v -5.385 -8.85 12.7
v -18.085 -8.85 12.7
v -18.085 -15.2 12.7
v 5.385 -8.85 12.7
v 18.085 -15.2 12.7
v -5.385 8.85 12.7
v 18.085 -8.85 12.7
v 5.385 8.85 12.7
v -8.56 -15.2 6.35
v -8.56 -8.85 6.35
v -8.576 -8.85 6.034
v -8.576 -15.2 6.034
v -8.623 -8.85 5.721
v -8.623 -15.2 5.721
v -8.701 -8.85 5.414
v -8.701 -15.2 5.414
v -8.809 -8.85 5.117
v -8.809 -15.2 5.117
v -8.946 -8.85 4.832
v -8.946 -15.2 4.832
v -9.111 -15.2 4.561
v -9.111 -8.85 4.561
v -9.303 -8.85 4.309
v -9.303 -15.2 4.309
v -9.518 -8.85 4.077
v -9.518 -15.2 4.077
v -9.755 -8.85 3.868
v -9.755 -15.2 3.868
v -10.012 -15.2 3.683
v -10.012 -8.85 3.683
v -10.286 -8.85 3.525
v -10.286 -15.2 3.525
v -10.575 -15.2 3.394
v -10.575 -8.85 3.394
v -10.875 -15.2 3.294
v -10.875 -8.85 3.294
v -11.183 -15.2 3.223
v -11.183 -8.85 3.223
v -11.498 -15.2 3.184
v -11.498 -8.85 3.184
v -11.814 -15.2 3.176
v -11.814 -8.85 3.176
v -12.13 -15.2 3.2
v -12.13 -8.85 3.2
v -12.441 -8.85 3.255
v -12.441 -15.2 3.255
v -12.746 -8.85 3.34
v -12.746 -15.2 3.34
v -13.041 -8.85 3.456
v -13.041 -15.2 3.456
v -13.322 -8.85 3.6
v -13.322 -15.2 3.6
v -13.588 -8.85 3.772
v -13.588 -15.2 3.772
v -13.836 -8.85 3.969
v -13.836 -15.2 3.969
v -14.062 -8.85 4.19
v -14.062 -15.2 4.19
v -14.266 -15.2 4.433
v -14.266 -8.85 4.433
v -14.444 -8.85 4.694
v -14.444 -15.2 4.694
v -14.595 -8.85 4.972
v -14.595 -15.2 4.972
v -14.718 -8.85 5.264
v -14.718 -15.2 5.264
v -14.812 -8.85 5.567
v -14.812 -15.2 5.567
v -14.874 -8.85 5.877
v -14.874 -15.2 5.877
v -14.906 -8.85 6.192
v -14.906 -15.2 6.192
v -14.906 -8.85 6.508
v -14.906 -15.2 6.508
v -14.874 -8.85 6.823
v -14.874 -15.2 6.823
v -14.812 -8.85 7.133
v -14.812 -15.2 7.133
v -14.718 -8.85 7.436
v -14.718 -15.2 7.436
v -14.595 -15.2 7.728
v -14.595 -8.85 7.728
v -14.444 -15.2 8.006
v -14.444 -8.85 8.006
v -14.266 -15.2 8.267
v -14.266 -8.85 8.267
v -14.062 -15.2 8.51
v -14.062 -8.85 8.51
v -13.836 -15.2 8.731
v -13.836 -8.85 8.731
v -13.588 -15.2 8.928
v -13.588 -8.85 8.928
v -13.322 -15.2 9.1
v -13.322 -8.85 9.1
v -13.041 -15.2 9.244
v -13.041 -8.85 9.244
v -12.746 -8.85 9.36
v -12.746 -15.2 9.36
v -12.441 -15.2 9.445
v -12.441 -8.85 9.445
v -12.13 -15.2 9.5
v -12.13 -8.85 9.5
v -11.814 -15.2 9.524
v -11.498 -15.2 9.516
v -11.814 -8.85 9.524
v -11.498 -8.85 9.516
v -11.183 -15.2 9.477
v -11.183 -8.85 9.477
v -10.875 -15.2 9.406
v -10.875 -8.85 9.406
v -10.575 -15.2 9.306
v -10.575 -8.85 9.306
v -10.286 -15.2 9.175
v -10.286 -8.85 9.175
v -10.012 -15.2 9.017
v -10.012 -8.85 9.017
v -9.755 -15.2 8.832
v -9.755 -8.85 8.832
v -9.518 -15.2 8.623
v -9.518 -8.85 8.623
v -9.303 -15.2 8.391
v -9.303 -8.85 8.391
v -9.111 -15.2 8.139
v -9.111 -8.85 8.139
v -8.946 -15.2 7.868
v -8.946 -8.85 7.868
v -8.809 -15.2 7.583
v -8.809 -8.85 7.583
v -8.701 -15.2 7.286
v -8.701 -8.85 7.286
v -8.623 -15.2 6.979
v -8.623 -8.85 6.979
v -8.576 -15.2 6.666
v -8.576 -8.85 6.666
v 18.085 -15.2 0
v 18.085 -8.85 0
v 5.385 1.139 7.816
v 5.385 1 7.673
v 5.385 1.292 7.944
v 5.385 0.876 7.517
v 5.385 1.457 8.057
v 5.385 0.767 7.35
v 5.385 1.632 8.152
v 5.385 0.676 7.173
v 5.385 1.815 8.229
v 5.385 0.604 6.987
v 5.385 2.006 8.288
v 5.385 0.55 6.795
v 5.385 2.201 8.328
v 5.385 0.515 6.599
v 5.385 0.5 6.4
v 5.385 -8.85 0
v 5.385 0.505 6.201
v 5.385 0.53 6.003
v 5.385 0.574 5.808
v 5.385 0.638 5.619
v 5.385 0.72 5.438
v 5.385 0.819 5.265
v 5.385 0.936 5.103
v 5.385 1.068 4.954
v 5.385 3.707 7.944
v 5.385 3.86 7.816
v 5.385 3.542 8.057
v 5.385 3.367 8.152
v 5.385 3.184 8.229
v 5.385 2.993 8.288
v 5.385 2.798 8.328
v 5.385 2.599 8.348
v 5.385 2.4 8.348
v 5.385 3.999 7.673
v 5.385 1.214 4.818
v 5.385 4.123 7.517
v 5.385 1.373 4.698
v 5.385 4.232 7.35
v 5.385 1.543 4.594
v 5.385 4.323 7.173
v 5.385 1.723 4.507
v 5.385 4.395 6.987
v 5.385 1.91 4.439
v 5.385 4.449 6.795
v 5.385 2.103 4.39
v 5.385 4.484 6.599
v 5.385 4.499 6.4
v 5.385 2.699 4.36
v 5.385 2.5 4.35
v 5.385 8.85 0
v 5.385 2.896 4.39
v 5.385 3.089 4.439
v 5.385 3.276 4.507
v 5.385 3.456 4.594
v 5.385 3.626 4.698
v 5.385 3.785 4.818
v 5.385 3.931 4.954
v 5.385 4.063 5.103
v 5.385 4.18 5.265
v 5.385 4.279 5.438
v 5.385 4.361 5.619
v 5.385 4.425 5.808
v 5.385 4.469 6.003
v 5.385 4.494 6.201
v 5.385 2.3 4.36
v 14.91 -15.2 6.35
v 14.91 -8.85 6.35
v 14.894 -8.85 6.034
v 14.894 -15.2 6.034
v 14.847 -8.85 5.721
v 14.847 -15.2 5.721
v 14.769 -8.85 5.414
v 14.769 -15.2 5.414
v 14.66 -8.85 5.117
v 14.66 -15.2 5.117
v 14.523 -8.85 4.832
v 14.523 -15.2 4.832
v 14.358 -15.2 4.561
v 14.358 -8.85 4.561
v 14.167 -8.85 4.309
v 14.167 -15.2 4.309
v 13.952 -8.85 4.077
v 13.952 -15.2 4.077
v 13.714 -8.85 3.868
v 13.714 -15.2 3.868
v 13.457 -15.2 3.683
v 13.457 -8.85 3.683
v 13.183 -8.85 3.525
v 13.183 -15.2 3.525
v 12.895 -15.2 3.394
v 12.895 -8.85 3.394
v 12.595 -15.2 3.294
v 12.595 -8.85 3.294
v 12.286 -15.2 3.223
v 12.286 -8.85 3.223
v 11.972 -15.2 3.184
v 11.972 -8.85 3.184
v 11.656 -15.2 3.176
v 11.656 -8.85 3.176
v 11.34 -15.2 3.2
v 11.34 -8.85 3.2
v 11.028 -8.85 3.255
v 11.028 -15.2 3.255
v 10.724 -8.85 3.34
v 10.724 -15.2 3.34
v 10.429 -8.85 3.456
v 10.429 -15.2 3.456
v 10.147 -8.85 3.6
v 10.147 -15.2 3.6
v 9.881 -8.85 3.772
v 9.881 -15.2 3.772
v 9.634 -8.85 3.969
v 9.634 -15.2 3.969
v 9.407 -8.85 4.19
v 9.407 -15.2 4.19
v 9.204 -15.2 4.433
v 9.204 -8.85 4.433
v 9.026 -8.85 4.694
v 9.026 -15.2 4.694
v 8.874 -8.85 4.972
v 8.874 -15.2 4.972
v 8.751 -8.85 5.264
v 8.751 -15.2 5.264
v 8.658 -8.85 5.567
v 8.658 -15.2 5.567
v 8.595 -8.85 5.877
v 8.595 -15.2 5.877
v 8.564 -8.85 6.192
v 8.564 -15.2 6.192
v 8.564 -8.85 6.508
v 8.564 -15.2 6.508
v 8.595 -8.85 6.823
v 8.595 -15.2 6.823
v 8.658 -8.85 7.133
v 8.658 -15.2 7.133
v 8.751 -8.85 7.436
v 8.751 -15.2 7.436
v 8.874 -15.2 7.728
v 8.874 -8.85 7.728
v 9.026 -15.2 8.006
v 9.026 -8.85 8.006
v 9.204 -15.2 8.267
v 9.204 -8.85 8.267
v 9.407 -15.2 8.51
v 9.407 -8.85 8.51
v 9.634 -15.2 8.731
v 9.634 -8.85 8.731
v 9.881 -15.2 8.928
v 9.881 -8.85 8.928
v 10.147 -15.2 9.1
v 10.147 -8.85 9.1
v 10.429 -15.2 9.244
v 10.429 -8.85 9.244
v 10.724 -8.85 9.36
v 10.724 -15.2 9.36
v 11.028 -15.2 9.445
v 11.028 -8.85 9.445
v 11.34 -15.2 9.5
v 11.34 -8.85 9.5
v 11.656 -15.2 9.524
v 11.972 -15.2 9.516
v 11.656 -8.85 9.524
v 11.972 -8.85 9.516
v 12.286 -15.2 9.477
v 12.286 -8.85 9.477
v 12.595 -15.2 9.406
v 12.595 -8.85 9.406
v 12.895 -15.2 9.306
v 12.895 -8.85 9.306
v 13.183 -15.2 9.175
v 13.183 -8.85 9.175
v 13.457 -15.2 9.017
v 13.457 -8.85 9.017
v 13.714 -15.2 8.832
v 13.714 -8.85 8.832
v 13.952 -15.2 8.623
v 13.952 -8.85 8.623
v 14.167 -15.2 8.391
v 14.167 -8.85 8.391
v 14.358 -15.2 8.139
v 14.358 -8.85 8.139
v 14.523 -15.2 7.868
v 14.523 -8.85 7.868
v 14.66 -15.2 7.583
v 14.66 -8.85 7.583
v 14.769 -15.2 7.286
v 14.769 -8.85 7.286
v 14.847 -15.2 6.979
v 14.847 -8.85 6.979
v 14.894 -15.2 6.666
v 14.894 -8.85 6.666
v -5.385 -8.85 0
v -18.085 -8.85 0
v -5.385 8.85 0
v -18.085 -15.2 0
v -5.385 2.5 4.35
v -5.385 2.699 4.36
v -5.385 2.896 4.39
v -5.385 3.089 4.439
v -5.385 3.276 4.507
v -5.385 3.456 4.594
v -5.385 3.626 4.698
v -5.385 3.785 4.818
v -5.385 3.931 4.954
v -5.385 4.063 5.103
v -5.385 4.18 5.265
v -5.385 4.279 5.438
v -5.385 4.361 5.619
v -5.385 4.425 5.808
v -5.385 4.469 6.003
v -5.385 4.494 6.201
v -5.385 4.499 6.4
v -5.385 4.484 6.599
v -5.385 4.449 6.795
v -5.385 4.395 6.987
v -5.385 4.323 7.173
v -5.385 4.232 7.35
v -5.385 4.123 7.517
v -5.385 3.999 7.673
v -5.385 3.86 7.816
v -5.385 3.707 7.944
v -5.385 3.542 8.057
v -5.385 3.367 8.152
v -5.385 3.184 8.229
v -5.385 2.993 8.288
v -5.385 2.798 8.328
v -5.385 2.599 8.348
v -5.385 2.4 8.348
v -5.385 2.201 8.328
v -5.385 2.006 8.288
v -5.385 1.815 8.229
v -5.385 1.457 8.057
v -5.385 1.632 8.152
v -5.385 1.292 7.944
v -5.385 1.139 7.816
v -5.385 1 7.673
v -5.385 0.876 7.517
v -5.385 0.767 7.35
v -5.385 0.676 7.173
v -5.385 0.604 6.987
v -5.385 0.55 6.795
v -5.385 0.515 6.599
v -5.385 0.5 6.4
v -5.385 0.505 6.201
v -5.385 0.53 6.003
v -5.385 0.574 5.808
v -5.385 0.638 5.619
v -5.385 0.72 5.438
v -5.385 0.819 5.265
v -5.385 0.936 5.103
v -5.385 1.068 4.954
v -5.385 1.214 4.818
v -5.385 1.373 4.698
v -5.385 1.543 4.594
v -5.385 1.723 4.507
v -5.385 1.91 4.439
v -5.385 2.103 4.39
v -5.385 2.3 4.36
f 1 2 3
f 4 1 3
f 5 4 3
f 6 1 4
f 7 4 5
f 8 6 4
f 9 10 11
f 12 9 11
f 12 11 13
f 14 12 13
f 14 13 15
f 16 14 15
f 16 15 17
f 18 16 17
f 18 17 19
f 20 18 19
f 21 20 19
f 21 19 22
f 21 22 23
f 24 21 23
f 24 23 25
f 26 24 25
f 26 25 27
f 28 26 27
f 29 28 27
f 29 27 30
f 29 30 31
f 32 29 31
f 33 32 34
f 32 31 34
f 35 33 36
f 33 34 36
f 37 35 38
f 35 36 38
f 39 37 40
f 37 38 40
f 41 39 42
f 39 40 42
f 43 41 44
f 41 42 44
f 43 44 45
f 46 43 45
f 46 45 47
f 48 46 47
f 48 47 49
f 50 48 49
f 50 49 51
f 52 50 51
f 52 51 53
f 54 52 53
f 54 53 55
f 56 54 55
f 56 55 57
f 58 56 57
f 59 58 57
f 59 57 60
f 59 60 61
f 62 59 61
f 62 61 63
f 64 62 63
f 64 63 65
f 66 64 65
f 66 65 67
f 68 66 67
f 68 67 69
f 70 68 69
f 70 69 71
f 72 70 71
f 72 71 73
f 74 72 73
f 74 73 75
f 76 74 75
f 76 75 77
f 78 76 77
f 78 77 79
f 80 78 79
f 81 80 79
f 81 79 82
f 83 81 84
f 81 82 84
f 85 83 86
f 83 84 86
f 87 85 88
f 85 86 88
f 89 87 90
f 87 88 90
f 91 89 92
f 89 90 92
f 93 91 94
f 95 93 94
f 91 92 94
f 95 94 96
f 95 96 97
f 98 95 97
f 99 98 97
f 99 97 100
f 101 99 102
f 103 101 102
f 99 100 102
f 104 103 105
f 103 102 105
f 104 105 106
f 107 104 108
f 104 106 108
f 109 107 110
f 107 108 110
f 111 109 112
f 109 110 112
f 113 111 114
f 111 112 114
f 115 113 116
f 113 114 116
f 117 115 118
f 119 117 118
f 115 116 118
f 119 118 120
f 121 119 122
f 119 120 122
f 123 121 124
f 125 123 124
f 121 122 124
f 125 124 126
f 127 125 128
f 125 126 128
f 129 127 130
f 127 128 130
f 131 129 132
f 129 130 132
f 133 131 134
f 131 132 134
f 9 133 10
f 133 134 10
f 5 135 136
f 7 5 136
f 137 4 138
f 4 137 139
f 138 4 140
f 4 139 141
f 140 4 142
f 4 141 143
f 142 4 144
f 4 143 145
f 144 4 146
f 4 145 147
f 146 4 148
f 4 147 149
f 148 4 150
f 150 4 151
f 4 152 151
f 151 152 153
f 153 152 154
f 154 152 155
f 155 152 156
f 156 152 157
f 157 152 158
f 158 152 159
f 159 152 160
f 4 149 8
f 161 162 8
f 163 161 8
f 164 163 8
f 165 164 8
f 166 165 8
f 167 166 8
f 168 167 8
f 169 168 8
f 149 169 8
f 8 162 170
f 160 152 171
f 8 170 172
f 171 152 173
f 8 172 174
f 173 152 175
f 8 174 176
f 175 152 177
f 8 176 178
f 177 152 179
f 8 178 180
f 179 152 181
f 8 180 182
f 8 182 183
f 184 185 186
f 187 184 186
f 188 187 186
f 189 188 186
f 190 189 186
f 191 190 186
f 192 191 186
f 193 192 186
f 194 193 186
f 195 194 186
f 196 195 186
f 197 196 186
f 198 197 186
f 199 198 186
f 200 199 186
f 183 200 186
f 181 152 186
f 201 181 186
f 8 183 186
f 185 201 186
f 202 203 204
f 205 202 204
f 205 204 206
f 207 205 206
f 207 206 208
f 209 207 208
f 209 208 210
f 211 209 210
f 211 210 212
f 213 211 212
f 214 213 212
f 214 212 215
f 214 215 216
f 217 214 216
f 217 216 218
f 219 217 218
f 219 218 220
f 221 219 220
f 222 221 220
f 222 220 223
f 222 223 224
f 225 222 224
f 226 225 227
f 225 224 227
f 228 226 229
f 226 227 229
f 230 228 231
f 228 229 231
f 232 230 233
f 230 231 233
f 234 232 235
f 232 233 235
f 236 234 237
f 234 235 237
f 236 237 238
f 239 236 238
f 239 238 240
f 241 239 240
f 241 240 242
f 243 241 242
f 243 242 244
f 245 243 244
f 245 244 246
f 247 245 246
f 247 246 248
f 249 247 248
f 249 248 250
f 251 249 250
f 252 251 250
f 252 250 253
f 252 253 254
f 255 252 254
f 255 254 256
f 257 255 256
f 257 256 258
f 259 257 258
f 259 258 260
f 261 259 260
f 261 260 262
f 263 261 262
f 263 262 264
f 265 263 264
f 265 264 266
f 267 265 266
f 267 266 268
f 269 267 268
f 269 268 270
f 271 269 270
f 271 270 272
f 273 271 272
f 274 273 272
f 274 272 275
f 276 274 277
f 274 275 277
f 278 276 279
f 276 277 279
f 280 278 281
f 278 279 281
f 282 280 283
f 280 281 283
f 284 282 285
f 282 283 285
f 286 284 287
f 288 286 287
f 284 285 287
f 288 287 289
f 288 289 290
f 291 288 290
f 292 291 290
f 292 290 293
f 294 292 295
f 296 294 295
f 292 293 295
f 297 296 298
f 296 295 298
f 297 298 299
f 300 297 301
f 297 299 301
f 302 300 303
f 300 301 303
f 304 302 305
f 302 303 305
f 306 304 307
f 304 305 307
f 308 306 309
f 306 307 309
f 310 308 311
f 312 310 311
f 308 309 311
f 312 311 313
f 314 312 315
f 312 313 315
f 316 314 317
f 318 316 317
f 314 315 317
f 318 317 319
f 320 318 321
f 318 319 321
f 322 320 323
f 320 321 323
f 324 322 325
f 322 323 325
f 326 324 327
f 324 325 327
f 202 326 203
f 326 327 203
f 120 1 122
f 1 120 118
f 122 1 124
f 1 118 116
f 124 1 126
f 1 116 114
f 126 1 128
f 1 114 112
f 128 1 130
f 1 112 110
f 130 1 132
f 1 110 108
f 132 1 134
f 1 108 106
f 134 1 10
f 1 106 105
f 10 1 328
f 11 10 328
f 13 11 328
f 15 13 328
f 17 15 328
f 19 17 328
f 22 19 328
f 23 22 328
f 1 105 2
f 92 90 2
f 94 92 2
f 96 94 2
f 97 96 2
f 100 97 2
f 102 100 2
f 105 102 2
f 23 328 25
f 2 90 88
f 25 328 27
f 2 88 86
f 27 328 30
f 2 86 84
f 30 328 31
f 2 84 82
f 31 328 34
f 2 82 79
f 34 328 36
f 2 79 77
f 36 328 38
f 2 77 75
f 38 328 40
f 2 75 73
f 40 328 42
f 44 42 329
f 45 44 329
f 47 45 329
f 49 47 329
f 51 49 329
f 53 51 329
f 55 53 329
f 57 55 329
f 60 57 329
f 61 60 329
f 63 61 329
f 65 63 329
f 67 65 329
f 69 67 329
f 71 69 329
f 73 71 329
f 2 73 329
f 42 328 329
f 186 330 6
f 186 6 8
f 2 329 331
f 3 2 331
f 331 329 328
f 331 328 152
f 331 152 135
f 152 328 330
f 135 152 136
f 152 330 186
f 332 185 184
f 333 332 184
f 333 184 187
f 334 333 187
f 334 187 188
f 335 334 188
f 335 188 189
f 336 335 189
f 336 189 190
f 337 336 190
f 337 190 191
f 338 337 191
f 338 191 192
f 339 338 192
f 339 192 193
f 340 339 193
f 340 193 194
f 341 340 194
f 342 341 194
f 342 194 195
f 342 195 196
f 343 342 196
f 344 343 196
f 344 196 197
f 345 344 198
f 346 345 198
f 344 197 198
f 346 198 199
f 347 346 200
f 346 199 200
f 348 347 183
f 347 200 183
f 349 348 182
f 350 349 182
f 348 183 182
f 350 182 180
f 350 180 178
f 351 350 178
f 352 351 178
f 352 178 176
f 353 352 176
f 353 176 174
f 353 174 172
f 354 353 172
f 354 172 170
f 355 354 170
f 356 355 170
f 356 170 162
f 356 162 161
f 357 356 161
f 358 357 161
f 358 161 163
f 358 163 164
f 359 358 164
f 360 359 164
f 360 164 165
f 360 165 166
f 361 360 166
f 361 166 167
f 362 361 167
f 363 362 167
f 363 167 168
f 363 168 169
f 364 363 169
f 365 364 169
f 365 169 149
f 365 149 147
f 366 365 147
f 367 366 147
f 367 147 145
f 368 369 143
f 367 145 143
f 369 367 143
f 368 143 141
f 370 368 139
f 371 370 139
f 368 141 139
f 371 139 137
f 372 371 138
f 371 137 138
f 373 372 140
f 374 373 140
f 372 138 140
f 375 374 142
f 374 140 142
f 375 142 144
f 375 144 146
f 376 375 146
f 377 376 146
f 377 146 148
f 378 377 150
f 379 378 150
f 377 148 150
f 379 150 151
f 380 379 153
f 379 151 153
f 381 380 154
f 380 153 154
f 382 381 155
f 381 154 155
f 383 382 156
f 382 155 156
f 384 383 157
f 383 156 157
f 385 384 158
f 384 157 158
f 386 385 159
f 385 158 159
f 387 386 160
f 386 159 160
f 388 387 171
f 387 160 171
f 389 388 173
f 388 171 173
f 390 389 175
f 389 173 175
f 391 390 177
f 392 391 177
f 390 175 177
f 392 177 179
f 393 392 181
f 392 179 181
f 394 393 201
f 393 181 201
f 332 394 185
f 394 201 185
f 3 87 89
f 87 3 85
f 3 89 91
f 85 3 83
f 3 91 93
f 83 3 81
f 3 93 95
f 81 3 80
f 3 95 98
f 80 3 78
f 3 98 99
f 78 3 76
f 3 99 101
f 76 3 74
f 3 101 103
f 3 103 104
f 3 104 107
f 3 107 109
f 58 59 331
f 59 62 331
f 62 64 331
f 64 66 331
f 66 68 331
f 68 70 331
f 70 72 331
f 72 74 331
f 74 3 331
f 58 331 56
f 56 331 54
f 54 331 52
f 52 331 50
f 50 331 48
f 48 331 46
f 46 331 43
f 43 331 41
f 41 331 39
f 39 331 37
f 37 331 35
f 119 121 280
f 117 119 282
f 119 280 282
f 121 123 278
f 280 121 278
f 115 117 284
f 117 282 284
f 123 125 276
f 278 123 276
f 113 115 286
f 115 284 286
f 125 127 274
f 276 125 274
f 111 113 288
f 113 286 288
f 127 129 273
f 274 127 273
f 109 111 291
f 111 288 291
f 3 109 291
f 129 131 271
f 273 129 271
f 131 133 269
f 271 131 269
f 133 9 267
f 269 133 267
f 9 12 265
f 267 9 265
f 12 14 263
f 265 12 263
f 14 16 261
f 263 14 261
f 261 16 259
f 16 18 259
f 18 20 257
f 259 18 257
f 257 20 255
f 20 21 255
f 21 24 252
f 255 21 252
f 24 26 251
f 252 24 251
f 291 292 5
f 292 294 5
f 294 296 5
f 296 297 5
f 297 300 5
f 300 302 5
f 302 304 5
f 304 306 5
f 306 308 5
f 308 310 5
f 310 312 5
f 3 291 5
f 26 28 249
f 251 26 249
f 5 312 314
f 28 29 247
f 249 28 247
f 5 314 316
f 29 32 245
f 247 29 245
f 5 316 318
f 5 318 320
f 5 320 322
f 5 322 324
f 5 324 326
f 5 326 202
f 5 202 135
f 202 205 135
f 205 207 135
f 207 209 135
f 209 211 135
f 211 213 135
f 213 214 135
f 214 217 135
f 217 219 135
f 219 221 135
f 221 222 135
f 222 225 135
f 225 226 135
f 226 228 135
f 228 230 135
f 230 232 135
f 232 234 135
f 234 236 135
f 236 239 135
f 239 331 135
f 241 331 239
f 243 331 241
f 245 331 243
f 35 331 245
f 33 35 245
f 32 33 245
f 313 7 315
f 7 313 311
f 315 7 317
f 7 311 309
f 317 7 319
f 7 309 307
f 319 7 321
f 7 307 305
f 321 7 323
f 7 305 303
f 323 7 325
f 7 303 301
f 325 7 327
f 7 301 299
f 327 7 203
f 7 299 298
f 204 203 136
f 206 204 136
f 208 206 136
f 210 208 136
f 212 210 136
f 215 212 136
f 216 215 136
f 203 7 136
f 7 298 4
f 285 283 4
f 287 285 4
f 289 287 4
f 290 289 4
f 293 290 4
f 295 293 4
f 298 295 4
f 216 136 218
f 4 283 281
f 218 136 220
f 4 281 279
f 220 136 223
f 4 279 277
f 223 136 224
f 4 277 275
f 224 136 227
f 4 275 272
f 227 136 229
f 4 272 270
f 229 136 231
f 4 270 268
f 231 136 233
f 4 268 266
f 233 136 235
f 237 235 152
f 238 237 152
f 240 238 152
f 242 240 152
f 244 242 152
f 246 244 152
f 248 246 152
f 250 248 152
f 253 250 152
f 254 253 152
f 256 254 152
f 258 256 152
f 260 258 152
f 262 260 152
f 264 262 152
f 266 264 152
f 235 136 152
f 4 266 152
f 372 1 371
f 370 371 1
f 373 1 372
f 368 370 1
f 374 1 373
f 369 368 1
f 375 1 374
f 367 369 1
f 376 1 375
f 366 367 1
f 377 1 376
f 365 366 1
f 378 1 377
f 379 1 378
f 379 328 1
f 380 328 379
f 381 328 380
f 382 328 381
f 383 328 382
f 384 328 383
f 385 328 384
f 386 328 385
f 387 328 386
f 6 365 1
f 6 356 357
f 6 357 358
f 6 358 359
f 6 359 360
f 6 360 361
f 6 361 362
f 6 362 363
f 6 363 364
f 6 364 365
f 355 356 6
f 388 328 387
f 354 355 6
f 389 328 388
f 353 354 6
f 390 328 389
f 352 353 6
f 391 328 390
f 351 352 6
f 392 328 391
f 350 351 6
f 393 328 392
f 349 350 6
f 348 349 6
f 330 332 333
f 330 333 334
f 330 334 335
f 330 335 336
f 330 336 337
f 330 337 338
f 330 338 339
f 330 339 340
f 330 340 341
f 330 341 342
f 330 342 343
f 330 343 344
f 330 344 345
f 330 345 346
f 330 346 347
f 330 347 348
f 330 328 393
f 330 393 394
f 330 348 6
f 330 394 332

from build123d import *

# Parameters (mm, degrees)
SKETCH1_W           = 10.7696
SKETCH1_H           = 17.699
BOSS_EXTRUDE1_DEPTH = 12.7
SKETCH5_R           = 2
CUT_EXTRUDE2_DEPTH  = 24.4696
SKETCH6_R           = 3.175
CUT_EXTRUDE3_DEPTH  = 7.35


with BuildPart() as part:
    # Sketch1 → Boss-Extrude1 (new body)
    with BuildSketch(Plane.XY):
        Polygon((18.0848, -8.8495), (5.3848, -8.8495), (-5.3848, -8.8495), (-18.0848, -8.8495), (-18.0848, -15.1995), (18.0848, -15.1995), align=None)
        Rectangle(SKETCH1_W, SKETCH1_H)
    extrude(amount=BOSS_EXTRUDE1_DEPTH)

    # Sketch5 → Cut-Extrude2 (cut, through all)
    with BuildSketch(Plane(origin=(5.3848, 0, 0), x_dir=(0, 0, -1), z_dir=(1, 0, 0))):
        with Locations((-6.35, 2.4995)):
            Circle(SKETCH5_R)
    extrude(amount=-CUT_EXTRUDE2_DEPTH, mode=Mode.SUBTRACT)

    # Sketch6 → Cut-Extrude3 (cut, through all)
    with BuildSketch(Plane(origin=(0, -8.8495, 0), x_dir=(1, 0, 0), z_dir=(0, 1, 0))):
        with Locations((-11.7348, -6.35)):
            Circle(SKETCH6_R)
        with Locations((11.7348, -6.35)):
            Circle(SKETCH6_R)
    extrude(amount=-CUT_EXTRUDE3_DEPTH, mode=Mode.SUBTRACT)


solid = part.part
